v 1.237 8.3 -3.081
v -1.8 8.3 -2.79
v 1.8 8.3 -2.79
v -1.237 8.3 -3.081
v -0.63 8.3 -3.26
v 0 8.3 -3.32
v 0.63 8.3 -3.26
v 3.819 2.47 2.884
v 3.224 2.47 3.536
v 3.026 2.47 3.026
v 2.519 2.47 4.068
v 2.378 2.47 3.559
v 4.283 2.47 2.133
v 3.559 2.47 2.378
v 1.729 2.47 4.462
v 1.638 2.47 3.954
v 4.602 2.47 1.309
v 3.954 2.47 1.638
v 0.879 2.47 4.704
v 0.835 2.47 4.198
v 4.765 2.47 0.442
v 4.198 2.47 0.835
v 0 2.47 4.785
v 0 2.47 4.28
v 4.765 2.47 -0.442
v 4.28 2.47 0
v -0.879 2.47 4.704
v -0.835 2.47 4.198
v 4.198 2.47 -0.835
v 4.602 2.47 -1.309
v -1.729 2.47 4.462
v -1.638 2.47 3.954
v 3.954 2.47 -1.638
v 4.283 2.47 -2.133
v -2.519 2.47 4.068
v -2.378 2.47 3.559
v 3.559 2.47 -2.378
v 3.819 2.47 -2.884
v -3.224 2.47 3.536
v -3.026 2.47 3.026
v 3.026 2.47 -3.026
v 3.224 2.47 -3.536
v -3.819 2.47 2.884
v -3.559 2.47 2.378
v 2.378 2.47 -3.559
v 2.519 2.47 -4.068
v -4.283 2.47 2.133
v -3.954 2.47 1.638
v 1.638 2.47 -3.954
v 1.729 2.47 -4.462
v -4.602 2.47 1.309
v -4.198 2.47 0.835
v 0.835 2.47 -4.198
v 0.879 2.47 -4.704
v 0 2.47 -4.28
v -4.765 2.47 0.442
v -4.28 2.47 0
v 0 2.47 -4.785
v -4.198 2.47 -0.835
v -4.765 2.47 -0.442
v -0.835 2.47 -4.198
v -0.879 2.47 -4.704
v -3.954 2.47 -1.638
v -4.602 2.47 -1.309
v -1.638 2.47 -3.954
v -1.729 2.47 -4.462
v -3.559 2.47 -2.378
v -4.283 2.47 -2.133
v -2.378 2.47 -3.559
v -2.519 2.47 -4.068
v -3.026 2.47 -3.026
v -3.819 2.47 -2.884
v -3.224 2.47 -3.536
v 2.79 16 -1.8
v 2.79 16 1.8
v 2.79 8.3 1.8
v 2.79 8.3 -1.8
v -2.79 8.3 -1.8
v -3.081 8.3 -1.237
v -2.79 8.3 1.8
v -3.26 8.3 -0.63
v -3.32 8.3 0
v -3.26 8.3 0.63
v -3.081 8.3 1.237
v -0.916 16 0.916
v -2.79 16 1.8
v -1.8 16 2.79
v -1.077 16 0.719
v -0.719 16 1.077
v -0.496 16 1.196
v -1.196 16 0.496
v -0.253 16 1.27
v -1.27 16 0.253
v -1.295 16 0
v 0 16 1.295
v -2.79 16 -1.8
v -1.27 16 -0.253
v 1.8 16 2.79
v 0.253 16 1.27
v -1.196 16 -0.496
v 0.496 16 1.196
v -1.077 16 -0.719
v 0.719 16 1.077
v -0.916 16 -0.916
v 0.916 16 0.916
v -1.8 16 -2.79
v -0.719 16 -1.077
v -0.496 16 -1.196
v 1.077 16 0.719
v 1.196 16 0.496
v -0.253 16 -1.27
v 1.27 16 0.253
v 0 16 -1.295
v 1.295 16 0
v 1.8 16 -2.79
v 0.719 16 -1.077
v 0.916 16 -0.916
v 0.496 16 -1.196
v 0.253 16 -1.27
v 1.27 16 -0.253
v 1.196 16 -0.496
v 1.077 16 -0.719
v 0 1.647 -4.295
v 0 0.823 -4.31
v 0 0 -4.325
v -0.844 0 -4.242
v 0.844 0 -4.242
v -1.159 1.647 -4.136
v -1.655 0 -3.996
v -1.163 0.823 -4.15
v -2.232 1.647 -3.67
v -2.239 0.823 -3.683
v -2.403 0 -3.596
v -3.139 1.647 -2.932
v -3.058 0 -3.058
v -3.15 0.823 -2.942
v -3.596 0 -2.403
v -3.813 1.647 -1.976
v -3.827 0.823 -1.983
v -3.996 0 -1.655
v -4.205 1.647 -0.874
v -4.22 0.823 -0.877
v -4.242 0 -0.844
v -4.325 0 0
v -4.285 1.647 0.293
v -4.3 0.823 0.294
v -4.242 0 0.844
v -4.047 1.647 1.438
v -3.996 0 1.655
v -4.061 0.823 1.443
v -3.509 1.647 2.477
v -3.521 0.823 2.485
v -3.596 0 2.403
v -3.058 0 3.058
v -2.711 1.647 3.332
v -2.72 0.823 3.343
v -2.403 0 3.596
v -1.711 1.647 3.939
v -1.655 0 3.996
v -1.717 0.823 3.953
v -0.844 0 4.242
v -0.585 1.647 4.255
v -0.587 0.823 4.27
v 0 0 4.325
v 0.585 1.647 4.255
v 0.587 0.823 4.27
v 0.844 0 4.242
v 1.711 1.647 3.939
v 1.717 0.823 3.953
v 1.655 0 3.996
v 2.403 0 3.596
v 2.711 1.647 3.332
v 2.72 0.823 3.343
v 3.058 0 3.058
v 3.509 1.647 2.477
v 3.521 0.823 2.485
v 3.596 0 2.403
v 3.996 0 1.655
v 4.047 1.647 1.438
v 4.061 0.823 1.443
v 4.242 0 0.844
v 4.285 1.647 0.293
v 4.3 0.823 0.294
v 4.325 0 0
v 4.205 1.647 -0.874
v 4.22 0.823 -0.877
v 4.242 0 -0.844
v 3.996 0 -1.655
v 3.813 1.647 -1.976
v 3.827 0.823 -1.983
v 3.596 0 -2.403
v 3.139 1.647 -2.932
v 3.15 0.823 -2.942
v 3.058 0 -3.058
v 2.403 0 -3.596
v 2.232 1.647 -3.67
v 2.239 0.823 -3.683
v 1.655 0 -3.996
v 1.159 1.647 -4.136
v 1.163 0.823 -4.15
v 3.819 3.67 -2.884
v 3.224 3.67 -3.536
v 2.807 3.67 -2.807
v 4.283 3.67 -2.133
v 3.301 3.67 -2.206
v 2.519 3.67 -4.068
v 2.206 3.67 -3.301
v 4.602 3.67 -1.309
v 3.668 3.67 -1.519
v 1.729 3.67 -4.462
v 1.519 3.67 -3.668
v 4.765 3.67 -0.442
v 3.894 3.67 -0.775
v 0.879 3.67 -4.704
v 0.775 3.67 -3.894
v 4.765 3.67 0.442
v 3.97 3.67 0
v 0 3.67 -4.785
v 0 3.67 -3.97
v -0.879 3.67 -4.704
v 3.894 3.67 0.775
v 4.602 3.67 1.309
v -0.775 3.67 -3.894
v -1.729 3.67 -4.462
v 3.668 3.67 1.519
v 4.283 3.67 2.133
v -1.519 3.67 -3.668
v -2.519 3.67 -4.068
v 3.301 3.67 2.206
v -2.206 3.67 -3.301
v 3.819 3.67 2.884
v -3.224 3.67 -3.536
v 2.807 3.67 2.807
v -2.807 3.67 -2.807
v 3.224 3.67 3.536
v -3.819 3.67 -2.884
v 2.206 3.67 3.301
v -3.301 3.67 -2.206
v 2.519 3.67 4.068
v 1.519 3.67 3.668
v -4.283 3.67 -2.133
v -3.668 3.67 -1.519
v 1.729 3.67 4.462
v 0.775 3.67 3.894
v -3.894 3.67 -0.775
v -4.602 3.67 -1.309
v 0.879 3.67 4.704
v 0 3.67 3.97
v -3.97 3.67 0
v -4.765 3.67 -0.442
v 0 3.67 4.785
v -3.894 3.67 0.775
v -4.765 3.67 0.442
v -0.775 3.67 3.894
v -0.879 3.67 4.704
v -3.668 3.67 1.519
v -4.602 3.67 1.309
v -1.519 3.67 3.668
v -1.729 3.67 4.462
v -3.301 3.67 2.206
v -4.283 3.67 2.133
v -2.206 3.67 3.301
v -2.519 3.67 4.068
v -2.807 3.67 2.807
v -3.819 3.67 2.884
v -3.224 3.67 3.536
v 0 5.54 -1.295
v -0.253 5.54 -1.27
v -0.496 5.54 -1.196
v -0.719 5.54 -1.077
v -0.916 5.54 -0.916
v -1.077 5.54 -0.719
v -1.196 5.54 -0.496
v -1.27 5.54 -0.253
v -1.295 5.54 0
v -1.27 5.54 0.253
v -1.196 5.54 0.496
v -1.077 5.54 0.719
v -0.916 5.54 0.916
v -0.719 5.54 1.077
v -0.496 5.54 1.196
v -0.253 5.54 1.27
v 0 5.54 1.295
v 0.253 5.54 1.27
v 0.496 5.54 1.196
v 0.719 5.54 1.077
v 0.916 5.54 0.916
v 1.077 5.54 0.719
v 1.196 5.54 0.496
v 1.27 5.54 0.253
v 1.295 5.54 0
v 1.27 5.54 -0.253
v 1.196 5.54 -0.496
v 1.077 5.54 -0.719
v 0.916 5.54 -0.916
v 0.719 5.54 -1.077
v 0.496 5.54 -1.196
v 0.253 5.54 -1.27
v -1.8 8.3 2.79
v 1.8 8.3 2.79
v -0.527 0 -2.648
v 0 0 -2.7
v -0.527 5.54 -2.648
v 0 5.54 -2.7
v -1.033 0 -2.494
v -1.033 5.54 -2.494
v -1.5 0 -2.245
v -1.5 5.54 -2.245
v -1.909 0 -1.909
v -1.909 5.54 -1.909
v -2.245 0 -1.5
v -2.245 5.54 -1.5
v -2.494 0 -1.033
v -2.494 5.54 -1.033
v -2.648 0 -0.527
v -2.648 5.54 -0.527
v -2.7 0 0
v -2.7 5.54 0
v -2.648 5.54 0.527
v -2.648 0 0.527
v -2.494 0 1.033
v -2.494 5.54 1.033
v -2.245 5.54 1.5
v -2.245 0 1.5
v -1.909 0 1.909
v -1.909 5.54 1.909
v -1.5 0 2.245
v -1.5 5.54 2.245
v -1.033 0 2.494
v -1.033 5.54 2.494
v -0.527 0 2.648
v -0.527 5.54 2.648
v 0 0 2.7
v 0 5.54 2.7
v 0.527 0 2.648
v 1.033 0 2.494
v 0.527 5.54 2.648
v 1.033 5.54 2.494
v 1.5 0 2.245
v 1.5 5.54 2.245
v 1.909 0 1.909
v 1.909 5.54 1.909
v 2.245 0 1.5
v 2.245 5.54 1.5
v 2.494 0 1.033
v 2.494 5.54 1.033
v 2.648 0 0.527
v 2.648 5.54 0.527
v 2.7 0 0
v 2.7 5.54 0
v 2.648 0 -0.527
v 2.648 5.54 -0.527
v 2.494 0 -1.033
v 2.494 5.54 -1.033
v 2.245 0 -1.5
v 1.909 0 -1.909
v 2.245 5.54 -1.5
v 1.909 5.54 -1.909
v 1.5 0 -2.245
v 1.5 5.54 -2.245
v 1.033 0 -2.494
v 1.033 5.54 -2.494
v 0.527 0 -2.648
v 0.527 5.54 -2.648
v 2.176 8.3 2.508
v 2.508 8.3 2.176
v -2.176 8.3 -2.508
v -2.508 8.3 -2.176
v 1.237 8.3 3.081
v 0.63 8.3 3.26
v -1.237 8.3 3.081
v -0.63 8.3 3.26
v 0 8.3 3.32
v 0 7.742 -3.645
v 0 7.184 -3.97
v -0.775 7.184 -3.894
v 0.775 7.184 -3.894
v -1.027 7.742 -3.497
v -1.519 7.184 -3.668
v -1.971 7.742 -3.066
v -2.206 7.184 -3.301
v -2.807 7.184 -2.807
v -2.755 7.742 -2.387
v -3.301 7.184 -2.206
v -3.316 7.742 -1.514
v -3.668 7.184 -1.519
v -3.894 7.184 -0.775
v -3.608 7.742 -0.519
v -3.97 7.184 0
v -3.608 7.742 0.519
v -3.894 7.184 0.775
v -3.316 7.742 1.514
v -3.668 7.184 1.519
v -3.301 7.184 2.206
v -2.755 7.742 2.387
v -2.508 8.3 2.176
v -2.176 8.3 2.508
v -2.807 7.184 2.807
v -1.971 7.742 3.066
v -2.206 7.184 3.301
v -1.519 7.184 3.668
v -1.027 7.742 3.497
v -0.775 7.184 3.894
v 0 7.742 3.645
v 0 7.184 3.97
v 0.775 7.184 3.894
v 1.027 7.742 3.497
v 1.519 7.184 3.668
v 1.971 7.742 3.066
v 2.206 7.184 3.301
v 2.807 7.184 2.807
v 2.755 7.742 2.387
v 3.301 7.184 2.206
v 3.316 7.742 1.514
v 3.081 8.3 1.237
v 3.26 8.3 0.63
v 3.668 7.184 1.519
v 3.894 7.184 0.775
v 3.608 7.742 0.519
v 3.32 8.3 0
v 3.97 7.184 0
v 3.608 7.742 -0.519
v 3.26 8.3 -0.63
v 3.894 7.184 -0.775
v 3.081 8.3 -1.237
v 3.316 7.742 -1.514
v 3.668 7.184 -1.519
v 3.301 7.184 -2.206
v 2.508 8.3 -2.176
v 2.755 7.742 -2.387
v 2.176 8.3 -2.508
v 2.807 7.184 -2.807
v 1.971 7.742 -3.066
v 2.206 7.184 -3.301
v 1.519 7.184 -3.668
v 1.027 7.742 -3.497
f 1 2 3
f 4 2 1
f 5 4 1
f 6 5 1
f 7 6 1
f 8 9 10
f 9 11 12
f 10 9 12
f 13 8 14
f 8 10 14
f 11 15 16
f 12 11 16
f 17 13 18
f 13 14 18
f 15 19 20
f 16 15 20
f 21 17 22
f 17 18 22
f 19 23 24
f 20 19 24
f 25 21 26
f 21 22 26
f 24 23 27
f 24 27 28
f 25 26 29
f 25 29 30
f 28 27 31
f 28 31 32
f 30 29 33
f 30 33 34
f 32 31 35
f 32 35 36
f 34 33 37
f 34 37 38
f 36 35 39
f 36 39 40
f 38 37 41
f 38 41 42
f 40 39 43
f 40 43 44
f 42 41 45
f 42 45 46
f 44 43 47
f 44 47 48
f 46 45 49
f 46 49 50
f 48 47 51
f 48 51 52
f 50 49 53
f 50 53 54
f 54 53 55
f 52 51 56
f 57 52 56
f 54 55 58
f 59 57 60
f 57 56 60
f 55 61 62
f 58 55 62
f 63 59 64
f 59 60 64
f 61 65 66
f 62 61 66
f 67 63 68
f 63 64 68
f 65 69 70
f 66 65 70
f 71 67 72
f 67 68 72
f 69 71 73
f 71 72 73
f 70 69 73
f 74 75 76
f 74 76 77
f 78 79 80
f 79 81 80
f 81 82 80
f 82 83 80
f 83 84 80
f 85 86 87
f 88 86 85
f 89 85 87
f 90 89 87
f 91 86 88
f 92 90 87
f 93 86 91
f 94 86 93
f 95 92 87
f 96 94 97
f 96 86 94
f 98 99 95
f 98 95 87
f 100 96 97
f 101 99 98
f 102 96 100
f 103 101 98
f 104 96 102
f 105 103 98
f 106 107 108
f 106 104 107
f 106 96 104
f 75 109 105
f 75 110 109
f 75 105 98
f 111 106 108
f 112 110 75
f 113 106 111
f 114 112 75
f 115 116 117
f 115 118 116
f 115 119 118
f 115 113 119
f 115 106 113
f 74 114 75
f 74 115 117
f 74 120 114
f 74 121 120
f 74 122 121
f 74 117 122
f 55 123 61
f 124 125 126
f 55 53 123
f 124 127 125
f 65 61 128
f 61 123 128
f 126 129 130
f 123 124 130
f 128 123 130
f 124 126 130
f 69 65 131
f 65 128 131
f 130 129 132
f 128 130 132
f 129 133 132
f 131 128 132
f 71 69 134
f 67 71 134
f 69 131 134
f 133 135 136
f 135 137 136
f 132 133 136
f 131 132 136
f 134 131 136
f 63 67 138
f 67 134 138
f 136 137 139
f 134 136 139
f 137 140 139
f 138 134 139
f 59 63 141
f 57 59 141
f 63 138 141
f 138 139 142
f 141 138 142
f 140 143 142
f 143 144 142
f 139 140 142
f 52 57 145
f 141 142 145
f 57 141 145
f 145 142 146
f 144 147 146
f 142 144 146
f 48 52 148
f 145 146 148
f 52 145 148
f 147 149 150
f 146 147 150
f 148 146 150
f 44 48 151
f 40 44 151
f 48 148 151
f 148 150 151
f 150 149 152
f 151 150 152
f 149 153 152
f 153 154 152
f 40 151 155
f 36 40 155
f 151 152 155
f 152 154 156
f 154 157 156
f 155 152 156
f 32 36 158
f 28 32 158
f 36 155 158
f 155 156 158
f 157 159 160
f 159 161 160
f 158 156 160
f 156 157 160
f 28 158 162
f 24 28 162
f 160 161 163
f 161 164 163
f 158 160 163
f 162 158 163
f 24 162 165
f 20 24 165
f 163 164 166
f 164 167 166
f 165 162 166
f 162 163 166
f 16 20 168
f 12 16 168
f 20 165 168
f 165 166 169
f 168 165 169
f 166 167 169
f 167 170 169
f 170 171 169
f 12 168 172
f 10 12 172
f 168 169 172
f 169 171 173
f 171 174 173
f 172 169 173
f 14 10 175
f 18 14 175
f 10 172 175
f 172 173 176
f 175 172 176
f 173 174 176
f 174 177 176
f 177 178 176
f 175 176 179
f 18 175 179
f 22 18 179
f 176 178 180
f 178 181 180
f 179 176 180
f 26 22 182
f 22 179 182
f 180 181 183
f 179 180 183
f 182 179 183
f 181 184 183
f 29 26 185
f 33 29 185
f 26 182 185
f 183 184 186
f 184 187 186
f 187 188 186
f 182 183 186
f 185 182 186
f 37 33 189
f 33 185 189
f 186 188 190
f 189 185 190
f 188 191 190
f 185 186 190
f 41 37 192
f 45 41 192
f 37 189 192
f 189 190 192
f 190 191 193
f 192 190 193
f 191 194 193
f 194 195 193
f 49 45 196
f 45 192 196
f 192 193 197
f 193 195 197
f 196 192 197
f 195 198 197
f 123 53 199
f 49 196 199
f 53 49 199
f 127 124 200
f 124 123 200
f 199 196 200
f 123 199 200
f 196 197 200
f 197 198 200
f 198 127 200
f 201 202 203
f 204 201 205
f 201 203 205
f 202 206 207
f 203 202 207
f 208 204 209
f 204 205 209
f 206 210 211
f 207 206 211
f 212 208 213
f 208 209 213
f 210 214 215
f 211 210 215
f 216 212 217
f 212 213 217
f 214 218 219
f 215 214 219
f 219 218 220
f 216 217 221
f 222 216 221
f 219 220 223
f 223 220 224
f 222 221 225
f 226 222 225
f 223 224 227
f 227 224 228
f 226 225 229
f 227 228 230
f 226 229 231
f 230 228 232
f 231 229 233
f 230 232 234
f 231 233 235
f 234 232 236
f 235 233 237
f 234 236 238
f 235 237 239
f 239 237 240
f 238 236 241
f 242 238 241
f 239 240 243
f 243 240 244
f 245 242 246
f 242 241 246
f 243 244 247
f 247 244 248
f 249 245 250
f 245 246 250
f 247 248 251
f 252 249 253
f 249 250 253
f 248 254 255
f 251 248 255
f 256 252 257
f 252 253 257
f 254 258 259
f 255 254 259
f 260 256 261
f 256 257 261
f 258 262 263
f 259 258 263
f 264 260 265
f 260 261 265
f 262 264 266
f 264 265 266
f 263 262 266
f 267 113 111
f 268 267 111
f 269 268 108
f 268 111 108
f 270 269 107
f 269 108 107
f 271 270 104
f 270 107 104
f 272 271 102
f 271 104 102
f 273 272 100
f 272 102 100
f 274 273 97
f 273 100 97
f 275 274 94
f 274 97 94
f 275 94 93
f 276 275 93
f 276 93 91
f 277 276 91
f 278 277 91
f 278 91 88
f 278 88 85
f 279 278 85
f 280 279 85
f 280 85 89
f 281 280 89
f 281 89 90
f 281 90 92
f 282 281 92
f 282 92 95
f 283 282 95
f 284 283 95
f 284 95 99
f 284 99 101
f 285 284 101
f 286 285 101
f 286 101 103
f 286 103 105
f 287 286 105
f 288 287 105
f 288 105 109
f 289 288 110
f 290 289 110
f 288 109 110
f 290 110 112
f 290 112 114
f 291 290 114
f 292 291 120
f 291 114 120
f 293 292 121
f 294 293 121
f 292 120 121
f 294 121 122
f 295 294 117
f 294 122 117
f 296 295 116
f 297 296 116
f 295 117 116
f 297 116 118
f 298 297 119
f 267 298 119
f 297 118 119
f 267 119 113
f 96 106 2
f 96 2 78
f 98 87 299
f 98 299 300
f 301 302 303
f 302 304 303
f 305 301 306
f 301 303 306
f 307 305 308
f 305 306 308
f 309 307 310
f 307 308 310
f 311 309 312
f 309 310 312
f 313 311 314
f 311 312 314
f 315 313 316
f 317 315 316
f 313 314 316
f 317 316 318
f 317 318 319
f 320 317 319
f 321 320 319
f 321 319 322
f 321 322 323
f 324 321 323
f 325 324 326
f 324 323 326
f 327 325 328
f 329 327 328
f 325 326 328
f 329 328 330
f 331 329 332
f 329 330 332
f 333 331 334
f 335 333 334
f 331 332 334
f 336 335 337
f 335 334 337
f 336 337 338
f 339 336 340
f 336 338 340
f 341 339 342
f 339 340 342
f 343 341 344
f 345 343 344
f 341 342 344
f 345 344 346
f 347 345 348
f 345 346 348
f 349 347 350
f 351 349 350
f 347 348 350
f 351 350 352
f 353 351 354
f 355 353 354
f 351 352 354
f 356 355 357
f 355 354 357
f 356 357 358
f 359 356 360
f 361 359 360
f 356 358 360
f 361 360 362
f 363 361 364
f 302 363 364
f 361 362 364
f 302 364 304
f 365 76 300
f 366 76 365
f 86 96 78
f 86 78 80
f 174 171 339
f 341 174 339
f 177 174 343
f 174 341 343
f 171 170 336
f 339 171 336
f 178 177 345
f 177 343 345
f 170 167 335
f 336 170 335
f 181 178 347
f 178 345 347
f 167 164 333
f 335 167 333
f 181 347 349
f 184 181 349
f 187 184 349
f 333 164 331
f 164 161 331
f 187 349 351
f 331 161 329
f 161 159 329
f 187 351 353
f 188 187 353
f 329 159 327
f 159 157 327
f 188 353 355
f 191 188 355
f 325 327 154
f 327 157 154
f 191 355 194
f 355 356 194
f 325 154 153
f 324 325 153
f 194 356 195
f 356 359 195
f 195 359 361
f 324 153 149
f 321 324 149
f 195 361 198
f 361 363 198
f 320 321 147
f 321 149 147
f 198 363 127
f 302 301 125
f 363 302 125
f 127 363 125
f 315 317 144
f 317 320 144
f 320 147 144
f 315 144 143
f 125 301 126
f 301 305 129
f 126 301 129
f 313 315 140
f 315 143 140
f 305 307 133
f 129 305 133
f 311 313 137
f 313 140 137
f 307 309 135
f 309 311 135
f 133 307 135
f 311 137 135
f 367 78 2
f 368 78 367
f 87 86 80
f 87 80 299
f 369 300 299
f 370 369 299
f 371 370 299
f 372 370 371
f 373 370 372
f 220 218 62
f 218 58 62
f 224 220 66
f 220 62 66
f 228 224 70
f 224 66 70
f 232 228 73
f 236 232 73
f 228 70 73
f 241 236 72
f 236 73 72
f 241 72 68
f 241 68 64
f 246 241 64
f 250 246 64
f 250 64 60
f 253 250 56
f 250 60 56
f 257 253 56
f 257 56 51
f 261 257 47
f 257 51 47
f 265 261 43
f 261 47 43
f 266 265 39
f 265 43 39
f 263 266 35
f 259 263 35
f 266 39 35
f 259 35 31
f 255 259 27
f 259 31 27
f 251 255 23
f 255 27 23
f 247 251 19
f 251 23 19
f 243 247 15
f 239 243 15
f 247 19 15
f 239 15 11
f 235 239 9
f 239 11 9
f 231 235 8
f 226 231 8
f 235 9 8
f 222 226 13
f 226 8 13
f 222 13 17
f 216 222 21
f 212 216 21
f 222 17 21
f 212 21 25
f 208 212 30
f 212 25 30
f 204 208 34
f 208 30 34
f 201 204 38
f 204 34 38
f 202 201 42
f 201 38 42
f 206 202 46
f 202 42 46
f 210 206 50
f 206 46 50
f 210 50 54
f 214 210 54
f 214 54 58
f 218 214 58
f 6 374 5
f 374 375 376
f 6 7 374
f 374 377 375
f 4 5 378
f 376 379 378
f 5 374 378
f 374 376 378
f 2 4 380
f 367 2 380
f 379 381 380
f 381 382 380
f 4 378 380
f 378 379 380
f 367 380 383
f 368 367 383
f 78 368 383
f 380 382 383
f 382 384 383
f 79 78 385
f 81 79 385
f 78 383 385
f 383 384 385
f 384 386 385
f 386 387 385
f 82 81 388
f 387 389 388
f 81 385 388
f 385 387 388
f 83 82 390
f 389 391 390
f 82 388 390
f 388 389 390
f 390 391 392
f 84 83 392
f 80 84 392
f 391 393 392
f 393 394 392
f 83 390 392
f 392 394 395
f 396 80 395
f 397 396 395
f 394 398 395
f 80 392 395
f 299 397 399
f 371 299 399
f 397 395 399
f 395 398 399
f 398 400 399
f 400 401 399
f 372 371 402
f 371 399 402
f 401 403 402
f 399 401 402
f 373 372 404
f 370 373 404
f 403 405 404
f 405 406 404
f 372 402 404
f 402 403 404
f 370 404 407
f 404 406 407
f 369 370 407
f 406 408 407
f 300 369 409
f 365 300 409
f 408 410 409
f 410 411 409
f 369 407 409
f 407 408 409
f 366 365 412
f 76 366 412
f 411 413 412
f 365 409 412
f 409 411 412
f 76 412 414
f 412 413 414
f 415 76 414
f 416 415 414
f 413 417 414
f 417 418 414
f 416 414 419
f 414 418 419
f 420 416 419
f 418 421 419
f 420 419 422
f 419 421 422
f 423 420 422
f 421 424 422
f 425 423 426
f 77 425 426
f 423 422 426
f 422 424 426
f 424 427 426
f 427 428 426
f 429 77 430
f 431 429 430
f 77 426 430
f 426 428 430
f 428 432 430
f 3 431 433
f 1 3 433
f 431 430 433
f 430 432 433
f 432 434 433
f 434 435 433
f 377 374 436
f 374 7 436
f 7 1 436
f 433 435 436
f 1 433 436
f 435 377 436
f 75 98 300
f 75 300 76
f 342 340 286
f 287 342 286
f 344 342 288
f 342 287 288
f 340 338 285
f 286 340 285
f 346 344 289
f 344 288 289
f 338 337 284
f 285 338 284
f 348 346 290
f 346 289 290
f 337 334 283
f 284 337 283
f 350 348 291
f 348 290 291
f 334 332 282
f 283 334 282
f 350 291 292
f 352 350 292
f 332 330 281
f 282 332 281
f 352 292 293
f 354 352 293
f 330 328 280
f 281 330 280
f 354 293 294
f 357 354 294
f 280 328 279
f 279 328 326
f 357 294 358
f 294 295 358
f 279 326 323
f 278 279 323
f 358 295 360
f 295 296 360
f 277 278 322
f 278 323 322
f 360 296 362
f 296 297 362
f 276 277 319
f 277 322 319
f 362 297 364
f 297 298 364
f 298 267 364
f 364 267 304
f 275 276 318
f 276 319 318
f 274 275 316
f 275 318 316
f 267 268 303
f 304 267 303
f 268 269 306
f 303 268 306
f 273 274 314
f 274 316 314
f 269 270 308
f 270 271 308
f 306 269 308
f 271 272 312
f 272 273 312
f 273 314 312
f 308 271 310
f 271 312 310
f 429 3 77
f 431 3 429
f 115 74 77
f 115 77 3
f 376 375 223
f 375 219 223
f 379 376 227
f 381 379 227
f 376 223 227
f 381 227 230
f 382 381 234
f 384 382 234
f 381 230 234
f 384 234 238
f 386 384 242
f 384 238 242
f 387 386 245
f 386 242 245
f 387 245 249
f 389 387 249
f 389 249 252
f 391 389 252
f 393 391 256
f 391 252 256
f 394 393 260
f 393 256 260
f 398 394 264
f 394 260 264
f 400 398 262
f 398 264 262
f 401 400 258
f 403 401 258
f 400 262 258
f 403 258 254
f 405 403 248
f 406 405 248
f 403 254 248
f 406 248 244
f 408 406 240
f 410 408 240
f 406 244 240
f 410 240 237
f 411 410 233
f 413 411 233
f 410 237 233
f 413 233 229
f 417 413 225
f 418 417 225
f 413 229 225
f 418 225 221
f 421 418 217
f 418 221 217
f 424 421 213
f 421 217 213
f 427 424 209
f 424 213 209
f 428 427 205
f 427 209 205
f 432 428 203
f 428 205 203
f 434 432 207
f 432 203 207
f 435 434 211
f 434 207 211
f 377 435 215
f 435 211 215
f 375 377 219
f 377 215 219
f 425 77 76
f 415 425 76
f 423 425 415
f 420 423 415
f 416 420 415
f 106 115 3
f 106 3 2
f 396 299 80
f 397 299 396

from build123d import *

# Parameters (mm, degrees)
BOSS_EXTRUDE1_START = 7.7
SKETCH2_R           = 1.295
BOSS_EXTRUDE1_DEPTH = 7.7


with BuildPart() as part:
    # Sketch1 → Revolve1 (revolve)
    with BuildSketch(Plane.XY, mode=Mode.PRIVATE) as revolve1_sk:
        Polygon((-2.7, 0), (-2.7, 5.54), (-1.295, 5.54), (-1.295, 8.3), (-3.32, 8.3), (-3.97, 7.184383121), (-3.97, 3.67), (-4.785, 3.67), (-4.785, 2.47), (-4.28, 2.47), (-4.325, 0), align=None)
    revolve(revolve1_sk.sketch.rotate(Axis((0, 0, 0), (0, 1, 0)), 270), axis=Axis((0, 0, 0), (0, 1, 0)))

    # Sketch2 → Boss-Extrude1 (add)
    with BuildSketch(Plane(origin=(0, 8.3, 0), x_dir=(1, 0, 0), z_dir=(0, 1, 0)).offset(BOSS_EXTRUDE1_START)):
        Polygon((1.799527716, 2.79), (-1.799527716, 2.79), (-2.79, 1.799527716), (-2.79, -1.799527716), (-1.799527716, -2.79), (1.799527716, -2.79), (2.79, -1.799527716), (2.79, 1.799527716), align=None)
        with Locations(Location((0, 0, 0), (0, 0, 90))):
            Circle(SKETCH2_R, mode=Mode.SUBTRACT)
    extrude(amount=-BOSS_EXTRUDE1_DEPTH)


solid = part.part
